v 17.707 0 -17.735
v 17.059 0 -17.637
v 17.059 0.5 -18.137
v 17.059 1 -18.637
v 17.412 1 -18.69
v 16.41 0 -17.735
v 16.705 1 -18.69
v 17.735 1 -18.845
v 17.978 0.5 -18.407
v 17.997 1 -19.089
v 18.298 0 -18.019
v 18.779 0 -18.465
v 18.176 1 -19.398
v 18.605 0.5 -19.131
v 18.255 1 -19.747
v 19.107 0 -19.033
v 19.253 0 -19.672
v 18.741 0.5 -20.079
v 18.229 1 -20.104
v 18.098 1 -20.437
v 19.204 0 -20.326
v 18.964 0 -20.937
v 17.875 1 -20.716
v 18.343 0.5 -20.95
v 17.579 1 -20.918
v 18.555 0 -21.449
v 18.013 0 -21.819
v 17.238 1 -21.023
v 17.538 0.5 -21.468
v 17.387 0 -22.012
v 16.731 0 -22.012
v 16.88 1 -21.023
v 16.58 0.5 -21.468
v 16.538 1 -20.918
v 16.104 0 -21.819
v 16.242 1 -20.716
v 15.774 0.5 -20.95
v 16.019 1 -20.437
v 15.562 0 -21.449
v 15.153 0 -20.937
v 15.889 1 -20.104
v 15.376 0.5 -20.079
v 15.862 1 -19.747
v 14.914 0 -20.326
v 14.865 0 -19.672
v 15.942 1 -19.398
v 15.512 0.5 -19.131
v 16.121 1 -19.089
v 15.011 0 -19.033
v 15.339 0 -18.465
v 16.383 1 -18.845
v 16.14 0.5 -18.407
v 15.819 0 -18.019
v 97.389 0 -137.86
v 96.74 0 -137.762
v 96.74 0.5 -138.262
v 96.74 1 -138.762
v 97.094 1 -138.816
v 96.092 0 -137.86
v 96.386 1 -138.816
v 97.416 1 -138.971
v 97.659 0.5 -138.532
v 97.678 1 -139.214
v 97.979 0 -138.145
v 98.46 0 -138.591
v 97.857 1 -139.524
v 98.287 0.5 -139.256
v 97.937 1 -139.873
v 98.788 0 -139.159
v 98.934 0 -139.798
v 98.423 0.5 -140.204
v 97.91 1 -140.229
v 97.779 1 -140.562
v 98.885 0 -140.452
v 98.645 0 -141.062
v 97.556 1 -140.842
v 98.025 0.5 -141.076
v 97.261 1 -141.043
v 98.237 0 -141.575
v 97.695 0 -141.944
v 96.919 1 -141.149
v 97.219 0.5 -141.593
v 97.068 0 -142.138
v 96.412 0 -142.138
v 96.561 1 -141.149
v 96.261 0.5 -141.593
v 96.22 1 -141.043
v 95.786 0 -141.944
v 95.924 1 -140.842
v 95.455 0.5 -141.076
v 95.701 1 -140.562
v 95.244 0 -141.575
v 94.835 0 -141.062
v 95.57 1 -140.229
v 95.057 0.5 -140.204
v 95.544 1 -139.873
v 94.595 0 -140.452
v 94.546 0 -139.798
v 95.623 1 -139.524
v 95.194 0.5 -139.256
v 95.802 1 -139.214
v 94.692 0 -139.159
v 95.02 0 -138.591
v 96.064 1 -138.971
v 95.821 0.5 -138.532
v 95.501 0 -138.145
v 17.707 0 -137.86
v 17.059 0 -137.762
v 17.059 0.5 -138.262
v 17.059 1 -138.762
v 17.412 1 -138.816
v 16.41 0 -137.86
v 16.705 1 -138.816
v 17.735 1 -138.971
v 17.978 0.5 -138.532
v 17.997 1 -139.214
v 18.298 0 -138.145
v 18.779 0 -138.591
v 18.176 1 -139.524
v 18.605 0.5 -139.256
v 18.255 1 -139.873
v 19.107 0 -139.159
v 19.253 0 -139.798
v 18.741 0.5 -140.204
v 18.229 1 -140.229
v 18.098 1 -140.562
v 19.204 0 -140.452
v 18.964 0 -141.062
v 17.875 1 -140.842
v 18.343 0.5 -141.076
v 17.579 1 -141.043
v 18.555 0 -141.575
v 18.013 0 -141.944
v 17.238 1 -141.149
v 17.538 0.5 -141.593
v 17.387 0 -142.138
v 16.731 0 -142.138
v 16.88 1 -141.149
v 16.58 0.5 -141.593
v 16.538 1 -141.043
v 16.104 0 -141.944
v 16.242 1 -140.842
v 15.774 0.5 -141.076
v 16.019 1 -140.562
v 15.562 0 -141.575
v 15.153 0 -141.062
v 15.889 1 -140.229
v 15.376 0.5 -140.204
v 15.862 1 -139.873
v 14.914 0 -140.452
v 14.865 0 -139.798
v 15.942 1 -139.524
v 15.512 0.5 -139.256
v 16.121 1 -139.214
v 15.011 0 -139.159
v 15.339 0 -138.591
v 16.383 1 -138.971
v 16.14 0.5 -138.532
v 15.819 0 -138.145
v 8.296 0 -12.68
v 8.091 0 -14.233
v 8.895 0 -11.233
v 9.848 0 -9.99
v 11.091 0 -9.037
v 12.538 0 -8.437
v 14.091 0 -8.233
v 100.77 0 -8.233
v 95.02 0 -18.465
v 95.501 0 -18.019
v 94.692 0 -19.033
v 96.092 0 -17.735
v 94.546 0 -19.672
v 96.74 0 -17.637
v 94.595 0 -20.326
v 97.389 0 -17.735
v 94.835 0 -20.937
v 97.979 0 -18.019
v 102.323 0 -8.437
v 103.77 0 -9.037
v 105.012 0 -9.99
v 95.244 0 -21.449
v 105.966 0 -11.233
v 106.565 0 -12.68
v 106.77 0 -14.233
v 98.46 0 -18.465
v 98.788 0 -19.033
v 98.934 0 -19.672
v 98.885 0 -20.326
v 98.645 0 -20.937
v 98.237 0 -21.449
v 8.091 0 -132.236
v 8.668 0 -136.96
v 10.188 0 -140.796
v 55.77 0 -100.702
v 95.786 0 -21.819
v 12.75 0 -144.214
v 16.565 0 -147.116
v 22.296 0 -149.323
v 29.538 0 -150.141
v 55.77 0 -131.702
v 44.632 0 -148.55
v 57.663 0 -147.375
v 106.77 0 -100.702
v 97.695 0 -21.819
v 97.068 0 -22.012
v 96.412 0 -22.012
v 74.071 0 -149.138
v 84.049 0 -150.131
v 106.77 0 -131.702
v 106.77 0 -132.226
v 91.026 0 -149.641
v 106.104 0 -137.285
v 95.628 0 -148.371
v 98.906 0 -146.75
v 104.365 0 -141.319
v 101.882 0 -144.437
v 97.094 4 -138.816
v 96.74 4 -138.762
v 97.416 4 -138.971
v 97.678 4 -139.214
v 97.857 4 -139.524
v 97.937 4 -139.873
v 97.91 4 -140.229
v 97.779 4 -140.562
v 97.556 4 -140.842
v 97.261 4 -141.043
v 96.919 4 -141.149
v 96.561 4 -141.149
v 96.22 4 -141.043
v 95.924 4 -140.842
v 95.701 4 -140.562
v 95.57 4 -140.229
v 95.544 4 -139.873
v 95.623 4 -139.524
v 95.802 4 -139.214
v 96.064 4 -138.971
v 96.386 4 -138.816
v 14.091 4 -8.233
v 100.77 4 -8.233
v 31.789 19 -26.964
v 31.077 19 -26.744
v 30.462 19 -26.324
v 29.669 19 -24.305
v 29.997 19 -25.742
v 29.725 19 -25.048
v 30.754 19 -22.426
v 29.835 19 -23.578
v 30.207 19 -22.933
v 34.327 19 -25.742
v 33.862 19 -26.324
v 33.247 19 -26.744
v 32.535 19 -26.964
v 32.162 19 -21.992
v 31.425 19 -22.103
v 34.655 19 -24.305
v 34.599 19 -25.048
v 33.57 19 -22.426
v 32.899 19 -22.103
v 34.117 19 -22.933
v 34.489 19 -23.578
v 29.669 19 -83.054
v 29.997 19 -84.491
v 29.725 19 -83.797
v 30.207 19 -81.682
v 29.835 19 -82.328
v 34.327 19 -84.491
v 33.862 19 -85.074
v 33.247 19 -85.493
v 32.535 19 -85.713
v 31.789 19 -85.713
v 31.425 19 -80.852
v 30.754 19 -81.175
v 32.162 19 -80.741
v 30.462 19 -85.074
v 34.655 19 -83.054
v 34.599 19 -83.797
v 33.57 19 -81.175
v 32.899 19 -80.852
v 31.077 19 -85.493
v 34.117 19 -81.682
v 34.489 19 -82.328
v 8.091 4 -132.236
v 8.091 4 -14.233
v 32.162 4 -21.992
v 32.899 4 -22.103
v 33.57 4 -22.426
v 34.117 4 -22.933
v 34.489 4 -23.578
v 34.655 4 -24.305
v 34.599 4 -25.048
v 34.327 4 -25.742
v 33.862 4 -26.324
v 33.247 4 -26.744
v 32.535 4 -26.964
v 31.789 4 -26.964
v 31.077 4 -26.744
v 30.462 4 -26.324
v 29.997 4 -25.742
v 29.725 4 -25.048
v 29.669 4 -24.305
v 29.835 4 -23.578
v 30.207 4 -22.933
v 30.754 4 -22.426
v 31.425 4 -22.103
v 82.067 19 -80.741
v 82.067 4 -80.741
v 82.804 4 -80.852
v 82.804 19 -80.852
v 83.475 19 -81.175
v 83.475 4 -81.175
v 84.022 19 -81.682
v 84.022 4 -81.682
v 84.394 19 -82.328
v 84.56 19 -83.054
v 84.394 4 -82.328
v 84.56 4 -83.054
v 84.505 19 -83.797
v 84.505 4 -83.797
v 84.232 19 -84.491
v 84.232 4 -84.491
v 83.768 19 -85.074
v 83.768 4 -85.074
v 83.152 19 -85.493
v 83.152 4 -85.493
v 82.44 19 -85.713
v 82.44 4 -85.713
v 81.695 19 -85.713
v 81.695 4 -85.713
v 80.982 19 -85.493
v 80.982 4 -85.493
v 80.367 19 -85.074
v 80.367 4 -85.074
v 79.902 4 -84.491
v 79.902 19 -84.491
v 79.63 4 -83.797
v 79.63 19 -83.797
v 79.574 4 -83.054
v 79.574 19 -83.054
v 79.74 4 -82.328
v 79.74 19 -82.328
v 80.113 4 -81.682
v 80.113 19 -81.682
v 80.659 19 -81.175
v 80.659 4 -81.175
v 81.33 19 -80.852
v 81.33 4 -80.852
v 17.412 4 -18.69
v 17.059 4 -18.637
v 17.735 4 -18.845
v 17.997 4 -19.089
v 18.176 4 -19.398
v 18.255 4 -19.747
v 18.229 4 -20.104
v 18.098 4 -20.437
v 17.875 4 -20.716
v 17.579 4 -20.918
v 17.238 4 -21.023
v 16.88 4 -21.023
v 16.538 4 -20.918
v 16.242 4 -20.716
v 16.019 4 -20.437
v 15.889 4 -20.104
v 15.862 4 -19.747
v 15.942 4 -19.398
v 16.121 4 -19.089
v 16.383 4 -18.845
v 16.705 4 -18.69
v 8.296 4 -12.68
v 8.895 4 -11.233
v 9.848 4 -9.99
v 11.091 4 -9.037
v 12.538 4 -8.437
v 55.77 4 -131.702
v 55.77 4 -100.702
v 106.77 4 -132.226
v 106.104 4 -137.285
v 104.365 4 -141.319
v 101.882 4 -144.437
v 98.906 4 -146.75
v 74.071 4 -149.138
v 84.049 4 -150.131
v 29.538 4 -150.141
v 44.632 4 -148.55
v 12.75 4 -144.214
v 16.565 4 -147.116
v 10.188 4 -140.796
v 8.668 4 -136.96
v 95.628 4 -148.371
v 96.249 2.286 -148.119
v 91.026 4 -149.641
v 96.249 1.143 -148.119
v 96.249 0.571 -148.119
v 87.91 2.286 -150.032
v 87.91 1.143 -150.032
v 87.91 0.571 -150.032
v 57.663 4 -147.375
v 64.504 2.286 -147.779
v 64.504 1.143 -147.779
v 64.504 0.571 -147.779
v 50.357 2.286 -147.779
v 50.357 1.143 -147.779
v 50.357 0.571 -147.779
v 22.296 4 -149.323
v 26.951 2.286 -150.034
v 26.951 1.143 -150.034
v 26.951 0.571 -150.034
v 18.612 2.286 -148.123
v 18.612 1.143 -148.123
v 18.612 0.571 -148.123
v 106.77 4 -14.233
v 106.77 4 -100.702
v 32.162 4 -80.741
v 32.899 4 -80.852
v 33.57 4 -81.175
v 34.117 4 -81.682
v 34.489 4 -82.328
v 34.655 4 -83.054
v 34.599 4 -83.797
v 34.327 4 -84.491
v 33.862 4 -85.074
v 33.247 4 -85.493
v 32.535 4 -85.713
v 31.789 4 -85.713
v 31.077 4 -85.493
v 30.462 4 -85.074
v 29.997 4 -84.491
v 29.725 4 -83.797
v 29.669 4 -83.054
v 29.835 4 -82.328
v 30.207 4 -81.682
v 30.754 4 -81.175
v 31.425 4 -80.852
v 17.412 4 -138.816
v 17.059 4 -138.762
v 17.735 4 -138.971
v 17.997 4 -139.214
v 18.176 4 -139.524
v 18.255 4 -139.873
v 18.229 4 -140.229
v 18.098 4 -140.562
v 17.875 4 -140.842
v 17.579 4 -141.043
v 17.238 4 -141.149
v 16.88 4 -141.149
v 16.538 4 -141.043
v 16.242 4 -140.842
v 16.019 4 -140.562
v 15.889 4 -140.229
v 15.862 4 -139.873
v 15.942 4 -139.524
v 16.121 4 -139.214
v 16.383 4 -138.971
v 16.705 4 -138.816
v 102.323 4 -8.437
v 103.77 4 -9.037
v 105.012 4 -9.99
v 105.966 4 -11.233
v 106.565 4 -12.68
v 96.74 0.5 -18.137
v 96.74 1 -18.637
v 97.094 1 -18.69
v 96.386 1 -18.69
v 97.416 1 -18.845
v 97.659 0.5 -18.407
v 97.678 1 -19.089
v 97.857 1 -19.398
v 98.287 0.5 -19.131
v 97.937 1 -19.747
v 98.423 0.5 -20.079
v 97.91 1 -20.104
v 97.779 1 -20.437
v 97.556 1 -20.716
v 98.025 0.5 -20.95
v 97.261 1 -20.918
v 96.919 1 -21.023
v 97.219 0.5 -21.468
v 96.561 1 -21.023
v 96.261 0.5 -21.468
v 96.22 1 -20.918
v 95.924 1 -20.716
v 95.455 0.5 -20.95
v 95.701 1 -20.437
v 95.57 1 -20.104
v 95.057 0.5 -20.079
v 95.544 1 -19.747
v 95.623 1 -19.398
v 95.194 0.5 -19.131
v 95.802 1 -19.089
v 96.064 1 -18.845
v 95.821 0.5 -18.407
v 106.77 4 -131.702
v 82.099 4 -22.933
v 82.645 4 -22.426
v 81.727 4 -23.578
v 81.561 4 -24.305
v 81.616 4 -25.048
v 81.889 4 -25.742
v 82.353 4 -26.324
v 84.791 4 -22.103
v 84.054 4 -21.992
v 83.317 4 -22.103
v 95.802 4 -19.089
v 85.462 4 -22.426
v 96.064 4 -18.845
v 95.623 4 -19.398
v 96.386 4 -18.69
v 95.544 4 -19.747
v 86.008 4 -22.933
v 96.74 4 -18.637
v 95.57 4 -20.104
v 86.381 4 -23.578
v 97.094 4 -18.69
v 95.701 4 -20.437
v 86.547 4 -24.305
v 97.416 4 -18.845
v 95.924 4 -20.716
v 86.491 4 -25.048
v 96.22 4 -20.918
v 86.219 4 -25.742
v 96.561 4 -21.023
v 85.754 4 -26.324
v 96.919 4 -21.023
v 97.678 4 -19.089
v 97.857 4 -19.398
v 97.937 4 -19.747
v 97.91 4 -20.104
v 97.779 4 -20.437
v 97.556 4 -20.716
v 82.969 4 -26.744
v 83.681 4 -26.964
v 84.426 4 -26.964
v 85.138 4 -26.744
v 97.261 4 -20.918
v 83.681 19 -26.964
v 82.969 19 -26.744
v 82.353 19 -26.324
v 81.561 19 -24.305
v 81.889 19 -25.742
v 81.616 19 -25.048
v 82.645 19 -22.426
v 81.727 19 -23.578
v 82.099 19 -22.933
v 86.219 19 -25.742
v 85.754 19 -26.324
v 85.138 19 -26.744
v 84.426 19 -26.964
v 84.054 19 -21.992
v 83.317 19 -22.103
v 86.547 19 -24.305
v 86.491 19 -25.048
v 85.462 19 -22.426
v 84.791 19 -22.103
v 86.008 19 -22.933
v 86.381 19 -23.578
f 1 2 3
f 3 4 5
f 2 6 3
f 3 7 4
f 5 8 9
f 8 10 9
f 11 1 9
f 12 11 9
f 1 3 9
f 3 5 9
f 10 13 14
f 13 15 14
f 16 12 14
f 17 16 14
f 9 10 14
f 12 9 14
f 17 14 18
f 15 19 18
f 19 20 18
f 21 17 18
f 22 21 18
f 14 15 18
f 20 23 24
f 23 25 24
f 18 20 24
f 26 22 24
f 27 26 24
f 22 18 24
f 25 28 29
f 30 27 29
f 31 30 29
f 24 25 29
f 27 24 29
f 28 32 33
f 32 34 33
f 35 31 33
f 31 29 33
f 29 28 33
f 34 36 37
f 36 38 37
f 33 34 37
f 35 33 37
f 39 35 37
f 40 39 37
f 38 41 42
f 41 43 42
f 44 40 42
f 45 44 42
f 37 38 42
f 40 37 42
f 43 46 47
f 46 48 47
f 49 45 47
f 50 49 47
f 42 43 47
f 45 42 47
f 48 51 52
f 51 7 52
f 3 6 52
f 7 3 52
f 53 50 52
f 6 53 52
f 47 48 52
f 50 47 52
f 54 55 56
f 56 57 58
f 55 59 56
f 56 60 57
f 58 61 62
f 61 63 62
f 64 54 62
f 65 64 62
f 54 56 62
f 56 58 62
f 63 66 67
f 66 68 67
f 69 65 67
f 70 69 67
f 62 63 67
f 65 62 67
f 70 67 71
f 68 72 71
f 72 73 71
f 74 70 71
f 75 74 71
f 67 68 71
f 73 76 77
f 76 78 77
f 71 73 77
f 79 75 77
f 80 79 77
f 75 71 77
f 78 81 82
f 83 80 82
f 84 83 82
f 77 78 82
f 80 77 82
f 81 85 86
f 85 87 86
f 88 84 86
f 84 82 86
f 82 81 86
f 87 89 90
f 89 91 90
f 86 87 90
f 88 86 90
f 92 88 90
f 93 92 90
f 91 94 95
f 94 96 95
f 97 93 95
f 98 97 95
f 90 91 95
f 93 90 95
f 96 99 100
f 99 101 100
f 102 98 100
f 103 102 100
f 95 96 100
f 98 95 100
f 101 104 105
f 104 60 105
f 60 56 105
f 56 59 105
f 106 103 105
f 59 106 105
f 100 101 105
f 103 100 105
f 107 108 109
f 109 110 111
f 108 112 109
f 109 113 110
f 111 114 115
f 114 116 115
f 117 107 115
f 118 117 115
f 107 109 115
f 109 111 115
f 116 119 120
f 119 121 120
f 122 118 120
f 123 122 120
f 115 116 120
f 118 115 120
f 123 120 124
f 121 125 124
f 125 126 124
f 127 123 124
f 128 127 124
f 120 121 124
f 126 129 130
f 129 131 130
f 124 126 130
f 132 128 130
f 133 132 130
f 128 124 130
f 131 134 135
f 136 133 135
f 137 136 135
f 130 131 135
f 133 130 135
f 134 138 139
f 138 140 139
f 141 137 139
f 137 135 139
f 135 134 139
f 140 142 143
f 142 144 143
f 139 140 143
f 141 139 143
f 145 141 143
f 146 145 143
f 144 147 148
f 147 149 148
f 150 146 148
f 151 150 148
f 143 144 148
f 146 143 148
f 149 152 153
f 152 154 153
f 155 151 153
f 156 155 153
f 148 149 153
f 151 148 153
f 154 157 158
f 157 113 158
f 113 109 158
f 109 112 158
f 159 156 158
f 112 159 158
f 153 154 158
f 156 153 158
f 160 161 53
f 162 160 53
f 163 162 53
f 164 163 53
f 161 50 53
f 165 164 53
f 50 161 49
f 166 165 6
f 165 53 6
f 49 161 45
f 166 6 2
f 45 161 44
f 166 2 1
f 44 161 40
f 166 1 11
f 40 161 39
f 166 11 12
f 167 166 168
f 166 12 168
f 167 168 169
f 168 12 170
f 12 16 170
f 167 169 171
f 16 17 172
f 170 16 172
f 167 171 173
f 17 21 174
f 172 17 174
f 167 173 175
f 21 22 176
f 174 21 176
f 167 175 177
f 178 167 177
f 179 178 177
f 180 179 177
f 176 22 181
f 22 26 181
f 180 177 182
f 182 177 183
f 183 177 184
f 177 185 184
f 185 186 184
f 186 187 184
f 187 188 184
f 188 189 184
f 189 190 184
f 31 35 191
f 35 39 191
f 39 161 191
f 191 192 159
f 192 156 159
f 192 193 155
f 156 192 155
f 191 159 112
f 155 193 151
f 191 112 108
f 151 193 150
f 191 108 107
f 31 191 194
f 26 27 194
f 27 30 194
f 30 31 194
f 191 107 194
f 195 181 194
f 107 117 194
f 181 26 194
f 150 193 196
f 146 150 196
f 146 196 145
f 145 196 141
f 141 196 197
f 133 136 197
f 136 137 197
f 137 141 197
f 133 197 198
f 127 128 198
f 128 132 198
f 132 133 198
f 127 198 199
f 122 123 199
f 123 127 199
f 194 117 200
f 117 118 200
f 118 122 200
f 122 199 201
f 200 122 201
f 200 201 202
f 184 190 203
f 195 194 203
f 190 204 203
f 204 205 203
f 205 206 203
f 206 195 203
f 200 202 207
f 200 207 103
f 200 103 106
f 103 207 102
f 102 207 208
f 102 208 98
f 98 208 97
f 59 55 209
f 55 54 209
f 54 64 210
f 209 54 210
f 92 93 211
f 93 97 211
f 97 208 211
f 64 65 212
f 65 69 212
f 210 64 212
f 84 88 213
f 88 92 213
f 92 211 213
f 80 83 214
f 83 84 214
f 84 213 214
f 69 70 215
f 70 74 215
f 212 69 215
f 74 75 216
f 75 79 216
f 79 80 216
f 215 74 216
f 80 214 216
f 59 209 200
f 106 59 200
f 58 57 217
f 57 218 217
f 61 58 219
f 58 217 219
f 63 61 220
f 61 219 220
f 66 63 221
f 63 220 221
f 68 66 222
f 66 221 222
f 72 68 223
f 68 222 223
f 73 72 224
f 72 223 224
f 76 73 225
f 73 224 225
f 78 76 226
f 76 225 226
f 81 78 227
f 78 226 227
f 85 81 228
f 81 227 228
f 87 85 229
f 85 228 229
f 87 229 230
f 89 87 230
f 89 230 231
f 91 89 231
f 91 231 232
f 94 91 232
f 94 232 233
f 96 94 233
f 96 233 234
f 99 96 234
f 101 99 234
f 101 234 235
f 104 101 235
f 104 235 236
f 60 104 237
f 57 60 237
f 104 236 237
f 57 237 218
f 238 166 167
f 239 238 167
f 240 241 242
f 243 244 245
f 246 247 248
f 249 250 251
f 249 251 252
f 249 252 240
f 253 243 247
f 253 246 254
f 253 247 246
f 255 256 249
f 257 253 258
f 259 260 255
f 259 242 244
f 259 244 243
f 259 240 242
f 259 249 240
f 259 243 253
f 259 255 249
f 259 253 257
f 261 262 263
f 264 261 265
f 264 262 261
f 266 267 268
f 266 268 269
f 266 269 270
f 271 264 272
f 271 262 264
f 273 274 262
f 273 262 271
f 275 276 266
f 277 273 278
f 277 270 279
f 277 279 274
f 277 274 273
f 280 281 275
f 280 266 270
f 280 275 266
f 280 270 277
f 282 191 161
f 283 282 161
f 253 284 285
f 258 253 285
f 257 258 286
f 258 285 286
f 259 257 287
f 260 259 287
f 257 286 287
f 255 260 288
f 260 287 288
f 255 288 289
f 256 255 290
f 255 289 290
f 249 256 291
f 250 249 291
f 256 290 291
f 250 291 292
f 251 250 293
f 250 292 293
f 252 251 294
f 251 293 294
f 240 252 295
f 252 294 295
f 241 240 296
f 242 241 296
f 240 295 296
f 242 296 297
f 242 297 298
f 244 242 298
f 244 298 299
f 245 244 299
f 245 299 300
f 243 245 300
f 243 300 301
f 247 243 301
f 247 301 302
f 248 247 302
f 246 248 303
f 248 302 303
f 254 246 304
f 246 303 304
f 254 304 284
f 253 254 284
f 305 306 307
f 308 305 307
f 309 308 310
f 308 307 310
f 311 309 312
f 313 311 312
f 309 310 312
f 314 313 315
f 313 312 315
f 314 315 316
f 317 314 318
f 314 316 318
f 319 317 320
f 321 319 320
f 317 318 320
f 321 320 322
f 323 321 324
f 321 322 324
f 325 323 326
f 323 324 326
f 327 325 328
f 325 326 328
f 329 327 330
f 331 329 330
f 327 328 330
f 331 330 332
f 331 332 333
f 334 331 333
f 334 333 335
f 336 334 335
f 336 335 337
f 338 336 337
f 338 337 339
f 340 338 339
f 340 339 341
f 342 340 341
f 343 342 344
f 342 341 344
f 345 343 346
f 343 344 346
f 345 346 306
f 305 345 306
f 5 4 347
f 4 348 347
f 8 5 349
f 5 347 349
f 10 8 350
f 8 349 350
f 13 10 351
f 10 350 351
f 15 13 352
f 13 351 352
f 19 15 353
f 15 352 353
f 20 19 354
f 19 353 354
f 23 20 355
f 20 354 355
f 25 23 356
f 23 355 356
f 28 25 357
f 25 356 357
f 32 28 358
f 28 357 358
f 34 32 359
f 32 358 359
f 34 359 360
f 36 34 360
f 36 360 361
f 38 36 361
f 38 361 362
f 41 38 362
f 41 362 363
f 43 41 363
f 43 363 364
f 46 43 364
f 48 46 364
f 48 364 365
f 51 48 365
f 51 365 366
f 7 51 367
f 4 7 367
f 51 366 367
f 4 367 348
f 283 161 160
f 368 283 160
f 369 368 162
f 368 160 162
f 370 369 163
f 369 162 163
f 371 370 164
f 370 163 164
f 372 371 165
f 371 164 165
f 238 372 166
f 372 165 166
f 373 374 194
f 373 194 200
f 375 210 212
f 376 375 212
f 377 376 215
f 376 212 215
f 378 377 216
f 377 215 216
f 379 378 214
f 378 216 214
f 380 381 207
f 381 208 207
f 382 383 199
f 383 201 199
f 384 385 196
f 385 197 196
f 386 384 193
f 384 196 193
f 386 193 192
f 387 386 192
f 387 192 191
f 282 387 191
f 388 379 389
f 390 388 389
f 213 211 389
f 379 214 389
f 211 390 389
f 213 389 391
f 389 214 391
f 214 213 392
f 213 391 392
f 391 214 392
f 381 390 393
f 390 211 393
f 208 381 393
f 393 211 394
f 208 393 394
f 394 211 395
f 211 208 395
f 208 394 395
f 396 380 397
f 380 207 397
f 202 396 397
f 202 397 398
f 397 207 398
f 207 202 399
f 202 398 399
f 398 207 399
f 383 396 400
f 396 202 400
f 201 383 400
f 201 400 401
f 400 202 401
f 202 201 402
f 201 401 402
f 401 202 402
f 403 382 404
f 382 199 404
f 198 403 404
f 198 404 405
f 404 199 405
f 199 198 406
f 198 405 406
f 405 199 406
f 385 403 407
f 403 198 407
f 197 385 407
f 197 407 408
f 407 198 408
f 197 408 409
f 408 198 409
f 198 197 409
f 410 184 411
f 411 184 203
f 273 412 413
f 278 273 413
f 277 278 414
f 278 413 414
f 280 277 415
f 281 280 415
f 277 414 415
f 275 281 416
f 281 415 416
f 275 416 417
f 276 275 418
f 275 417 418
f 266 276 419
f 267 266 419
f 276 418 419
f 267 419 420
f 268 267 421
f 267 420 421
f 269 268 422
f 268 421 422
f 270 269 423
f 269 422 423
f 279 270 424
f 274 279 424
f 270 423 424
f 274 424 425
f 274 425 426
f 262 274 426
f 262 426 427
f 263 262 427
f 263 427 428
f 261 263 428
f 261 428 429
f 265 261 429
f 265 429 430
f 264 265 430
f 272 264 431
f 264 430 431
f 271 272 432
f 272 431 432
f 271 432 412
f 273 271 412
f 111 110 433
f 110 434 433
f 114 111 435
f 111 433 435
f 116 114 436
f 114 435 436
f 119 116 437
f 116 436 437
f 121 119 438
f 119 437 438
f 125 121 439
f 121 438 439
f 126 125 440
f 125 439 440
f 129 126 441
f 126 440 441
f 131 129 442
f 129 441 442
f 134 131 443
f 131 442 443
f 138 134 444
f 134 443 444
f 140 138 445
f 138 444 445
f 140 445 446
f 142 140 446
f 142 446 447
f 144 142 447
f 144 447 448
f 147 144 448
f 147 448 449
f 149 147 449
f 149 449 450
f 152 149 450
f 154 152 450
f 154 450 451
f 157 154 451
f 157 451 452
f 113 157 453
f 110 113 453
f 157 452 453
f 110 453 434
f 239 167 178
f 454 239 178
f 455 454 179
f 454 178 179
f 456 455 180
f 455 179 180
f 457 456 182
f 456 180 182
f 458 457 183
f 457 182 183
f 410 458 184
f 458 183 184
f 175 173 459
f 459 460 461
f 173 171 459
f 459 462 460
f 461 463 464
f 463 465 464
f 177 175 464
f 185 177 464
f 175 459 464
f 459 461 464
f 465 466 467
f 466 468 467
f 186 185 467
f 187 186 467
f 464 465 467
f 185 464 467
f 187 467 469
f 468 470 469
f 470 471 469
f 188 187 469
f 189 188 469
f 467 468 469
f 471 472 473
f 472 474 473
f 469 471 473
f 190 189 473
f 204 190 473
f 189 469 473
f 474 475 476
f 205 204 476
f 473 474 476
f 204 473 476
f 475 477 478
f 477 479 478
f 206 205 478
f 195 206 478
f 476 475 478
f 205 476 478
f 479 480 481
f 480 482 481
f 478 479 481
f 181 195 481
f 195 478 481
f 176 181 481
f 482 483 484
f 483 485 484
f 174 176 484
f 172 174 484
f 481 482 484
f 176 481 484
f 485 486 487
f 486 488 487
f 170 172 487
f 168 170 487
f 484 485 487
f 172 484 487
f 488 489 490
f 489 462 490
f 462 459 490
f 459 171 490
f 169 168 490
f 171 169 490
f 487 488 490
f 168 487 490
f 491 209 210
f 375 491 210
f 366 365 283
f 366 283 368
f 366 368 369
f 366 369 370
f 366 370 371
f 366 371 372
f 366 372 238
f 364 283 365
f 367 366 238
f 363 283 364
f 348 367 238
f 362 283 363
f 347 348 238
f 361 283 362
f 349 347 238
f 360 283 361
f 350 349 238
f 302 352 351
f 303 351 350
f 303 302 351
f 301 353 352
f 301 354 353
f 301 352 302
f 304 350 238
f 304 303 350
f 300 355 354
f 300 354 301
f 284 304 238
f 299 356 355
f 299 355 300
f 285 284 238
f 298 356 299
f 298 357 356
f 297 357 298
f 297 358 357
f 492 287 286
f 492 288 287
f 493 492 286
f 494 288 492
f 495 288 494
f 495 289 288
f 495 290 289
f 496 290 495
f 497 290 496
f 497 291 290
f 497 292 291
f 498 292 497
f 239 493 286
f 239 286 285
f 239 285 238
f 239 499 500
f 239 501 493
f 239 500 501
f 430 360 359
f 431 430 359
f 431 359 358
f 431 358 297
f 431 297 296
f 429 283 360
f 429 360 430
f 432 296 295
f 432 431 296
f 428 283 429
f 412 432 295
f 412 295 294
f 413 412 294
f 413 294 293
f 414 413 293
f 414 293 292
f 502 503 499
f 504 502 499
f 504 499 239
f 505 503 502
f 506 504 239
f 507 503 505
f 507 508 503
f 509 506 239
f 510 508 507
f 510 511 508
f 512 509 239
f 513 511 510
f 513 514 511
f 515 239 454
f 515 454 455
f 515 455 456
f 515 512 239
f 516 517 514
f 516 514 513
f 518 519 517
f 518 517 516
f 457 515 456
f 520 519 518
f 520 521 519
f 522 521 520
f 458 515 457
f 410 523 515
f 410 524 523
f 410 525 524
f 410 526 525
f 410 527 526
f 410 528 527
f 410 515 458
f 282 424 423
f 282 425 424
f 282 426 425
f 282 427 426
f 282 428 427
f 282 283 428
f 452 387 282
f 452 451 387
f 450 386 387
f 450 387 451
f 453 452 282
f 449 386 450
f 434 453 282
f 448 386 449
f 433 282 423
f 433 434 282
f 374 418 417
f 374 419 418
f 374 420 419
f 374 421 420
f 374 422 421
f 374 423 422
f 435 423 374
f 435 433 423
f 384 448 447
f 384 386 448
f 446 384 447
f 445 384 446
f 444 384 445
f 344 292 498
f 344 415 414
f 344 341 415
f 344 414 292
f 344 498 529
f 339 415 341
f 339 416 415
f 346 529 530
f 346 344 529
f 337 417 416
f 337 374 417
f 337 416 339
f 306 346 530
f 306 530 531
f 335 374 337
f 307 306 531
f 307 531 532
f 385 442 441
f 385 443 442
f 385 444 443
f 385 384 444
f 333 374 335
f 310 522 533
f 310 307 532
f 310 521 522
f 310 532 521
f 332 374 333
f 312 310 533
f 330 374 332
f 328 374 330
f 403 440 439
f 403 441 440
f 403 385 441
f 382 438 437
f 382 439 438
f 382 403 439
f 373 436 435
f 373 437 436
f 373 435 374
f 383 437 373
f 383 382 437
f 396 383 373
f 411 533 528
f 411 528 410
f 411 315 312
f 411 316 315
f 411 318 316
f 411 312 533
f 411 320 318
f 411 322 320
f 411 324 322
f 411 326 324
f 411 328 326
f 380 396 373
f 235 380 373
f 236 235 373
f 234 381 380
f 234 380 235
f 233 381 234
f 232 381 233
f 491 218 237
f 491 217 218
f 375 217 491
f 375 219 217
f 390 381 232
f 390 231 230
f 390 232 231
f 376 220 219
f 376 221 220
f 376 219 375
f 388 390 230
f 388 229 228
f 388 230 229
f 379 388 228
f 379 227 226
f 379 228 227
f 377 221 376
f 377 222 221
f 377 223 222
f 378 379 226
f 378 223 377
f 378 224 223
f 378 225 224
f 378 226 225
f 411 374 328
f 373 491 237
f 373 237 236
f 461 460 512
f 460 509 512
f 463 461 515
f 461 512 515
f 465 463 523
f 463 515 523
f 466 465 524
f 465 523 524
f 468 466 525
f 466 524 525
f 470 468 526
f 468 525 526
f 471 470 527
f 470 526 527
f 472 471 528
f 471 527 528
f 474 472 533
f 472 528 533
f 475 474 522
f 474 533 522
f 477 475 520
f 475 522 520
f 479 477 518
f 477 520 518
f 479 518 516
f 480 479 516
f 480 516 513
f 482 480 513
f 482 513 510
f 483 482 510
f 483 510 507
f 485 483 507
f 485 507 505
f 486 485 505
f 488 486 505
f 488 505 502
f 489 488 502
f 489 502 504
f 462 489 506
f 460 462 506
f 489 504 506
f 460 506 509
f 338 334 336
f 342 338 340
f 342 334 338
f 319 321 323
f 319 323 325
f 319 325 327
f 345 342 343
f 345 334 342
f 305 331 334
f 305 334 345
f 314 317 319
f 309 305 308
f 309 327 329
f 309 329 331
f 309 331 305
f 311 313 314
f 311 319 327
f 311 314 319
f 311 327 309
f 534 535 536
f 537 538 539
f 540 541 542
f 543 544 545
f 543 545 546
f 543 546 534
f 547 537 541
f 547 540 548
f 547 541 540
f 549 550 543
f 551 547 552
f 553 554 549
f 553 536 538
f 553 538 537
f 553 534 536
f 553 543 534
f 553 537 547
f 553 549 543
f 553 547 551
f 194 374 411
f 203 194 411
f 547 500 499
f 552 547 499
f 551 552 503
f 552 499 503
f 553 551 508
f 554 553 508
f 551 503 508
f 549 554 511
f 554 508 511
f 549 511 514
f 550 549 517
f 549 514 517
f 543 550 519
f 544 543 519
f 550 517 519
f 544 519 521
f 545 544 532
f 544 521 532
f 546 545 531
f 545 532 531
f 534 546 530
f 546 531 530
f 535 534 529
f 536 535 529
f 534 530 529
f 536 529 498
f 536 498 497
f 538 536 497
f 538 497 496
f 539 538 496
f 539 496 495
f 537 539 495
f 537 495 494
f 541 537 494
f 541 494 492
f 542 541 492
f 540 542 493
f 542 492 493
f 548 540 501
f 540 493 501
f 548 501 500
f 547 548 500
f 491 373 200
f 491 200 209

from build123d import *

# Parameters (mm, degrees)
BOSS_EXTRUDE1_DEPTH                             = 4
SKETCH2_R                                       = 2.5
BOSS_EXTRUDE2_DEPTH                             = 15
SKETCH3_W                                       = 51
SKETCH3_H                                       = 31
CUT_EXTRUDE1_DEPTH                              = 15
CSK_FOR_M2_FLAT_HEAD_MACHINE_SCREW1_D           = 2.4
CSK_FOR_M2_FLAT_HEAD_MACHINE_SCREW1_DEPTH       = 58
CSK_FOR_M2_FLAT_HEAD_MACHINE_SCREW1_CSINK_D     = 4.4
CSK_FOR_M2_FLAT_HEAD_MACHINE_SCREW1_CSINK_ANGLE = 90
CSK_FOR_M2_FLAT_HEAD_MACHINE_SCREW1_TIP         = 0.721032743


# Read off the part's stored shape, not the designer's step: Boss-Extrude1
with BuildPart() as part:
    # Boss-Extrude1 outline → Boss-Extrude1 (new body)
    with BuildSketch(Plane(origin=(0, 0, 0), x_dir=(1, 0, 0), z_dir=(0, 1, 0))):
        with BuildLine():
            ThreePointArc((100.769776489, 8.232980914), (105.012417176, 9.990340227), (106.769776489, 14.232980914))
            Line((106.769776489, 14.232980914), (106.769776489, 132.22554715))
            add(Edge.make_bspline(
                [(106.769776489, 132.22554715), (106.769776489, 159.234690285), (66.769776489, 155.557917259), (71.369776489, 140.524437357), (43.491097907, 140.524437357), (48.091097907, 155.557917259), (8.091097907, 159.234690285), (8.091097907, 132.236386798)],
                knots=[0, 0, 0, 0, 0, 0, 0, 0, 1, 1, 1, 1, 1, 1, 1, 1], degree=7))
            Line((8.091097907, 132.236386798), (8.091097907, 14.232980914))
            ThreePointArc((8.091097907, 14.232980914), (9.84845722, 9.990340227), (14.091097907, 8.232980914))
            Line((14.091097907, 8.232980914), (100.769776489, 8.232980914))
        make_face()
    extrude(amount=BOSS_EXTRUDE1_DEPTH)

    # Sketch2 → Boss-Extrude2 (add)
    with BuildSketch(Plane(origin=(0, 4, 0), x_dir=(1, 0, 0), z_dir=(0, 1, 0))):
        with Locations(Location((32.161972906, 83.24092865, 0), (0, 0, 270))):
            Circle(SKETCH2_R)
        with Locations(Location((82.067189883, 83.24092865, 0), (0, 0, 270))):
            Circle(SKETCH2_R)
        with Locations(Location((32.161972906, 24.49174917, 0), (0, 0, 270))):
            Circle(SKETCH2_R)
        with Locations(Location((84.053708344, 24.49174917, 0), (0, 0, 270))):
            Circle(SKETCH2_R)
    extrude(amount=BOSS_EXTRUDE2_DEPTH)

    # Sketch3 → Cut-Extrude1 (cut)
    with BuildSketch(Plane(origin=(0, 4, 0), x_dir=(1, 0, 0), z_dir=(0, 1, 0))):
        with Locations((81.269776489, 116.201924425)):
            Rectangle(SKETCH3_W, SKETCH3_H)
    extrude(amount=-CUT_EXTRUDE1_DEPTH, mode=Mode.SUBTRACT)

    # CSK for M2 Flat Head Machine Screw1
    with Locations(Plane(origin=(17.058706918, 0, -139.962329176), x_dir=(0, 0, -1), z_dir=(0, -1, 0))):
        with Locations((0, 0), (0, 79.68146648), (-120.125549754, 0), (-120.125549754, 79.68146648)):
            CounterSinkHole(CSK_FOR_M2_FLAT_HEAD_MACHINE_SCREW1_D / 2, CSK_FOR_M2_FLAT_HEAD_MACHINE_SCREW1_CSINK_D / 2, depth=CSK_FOR_M2_FLAT_HEAD_MACHINE_SCREW1_DEPTH, counter_sink_angle=CSK_FOR_M2_FLAT_HEAD_MACHINE_SCREW1_CSINK_ANGLE)
            with Locations((0, 0, -(CSK_FOR_M2_FLAT_HEAD_MACHINE_SCREW1_DEPTH + CSK_FOR_M2_FLAT_HEAD_MACHINE_SCREW1_TIP / 2))):  # 118° drill point
                Cone(0, CSK_FOR_M2_FLAT_HEAD_MACHINE_SCREW1_D / 2, CSK_FOR_M2_FLAT_HEAD_MACHINE_SCREW1_TIP, mode=Mode.SUBTRACT)


solid = part.part
